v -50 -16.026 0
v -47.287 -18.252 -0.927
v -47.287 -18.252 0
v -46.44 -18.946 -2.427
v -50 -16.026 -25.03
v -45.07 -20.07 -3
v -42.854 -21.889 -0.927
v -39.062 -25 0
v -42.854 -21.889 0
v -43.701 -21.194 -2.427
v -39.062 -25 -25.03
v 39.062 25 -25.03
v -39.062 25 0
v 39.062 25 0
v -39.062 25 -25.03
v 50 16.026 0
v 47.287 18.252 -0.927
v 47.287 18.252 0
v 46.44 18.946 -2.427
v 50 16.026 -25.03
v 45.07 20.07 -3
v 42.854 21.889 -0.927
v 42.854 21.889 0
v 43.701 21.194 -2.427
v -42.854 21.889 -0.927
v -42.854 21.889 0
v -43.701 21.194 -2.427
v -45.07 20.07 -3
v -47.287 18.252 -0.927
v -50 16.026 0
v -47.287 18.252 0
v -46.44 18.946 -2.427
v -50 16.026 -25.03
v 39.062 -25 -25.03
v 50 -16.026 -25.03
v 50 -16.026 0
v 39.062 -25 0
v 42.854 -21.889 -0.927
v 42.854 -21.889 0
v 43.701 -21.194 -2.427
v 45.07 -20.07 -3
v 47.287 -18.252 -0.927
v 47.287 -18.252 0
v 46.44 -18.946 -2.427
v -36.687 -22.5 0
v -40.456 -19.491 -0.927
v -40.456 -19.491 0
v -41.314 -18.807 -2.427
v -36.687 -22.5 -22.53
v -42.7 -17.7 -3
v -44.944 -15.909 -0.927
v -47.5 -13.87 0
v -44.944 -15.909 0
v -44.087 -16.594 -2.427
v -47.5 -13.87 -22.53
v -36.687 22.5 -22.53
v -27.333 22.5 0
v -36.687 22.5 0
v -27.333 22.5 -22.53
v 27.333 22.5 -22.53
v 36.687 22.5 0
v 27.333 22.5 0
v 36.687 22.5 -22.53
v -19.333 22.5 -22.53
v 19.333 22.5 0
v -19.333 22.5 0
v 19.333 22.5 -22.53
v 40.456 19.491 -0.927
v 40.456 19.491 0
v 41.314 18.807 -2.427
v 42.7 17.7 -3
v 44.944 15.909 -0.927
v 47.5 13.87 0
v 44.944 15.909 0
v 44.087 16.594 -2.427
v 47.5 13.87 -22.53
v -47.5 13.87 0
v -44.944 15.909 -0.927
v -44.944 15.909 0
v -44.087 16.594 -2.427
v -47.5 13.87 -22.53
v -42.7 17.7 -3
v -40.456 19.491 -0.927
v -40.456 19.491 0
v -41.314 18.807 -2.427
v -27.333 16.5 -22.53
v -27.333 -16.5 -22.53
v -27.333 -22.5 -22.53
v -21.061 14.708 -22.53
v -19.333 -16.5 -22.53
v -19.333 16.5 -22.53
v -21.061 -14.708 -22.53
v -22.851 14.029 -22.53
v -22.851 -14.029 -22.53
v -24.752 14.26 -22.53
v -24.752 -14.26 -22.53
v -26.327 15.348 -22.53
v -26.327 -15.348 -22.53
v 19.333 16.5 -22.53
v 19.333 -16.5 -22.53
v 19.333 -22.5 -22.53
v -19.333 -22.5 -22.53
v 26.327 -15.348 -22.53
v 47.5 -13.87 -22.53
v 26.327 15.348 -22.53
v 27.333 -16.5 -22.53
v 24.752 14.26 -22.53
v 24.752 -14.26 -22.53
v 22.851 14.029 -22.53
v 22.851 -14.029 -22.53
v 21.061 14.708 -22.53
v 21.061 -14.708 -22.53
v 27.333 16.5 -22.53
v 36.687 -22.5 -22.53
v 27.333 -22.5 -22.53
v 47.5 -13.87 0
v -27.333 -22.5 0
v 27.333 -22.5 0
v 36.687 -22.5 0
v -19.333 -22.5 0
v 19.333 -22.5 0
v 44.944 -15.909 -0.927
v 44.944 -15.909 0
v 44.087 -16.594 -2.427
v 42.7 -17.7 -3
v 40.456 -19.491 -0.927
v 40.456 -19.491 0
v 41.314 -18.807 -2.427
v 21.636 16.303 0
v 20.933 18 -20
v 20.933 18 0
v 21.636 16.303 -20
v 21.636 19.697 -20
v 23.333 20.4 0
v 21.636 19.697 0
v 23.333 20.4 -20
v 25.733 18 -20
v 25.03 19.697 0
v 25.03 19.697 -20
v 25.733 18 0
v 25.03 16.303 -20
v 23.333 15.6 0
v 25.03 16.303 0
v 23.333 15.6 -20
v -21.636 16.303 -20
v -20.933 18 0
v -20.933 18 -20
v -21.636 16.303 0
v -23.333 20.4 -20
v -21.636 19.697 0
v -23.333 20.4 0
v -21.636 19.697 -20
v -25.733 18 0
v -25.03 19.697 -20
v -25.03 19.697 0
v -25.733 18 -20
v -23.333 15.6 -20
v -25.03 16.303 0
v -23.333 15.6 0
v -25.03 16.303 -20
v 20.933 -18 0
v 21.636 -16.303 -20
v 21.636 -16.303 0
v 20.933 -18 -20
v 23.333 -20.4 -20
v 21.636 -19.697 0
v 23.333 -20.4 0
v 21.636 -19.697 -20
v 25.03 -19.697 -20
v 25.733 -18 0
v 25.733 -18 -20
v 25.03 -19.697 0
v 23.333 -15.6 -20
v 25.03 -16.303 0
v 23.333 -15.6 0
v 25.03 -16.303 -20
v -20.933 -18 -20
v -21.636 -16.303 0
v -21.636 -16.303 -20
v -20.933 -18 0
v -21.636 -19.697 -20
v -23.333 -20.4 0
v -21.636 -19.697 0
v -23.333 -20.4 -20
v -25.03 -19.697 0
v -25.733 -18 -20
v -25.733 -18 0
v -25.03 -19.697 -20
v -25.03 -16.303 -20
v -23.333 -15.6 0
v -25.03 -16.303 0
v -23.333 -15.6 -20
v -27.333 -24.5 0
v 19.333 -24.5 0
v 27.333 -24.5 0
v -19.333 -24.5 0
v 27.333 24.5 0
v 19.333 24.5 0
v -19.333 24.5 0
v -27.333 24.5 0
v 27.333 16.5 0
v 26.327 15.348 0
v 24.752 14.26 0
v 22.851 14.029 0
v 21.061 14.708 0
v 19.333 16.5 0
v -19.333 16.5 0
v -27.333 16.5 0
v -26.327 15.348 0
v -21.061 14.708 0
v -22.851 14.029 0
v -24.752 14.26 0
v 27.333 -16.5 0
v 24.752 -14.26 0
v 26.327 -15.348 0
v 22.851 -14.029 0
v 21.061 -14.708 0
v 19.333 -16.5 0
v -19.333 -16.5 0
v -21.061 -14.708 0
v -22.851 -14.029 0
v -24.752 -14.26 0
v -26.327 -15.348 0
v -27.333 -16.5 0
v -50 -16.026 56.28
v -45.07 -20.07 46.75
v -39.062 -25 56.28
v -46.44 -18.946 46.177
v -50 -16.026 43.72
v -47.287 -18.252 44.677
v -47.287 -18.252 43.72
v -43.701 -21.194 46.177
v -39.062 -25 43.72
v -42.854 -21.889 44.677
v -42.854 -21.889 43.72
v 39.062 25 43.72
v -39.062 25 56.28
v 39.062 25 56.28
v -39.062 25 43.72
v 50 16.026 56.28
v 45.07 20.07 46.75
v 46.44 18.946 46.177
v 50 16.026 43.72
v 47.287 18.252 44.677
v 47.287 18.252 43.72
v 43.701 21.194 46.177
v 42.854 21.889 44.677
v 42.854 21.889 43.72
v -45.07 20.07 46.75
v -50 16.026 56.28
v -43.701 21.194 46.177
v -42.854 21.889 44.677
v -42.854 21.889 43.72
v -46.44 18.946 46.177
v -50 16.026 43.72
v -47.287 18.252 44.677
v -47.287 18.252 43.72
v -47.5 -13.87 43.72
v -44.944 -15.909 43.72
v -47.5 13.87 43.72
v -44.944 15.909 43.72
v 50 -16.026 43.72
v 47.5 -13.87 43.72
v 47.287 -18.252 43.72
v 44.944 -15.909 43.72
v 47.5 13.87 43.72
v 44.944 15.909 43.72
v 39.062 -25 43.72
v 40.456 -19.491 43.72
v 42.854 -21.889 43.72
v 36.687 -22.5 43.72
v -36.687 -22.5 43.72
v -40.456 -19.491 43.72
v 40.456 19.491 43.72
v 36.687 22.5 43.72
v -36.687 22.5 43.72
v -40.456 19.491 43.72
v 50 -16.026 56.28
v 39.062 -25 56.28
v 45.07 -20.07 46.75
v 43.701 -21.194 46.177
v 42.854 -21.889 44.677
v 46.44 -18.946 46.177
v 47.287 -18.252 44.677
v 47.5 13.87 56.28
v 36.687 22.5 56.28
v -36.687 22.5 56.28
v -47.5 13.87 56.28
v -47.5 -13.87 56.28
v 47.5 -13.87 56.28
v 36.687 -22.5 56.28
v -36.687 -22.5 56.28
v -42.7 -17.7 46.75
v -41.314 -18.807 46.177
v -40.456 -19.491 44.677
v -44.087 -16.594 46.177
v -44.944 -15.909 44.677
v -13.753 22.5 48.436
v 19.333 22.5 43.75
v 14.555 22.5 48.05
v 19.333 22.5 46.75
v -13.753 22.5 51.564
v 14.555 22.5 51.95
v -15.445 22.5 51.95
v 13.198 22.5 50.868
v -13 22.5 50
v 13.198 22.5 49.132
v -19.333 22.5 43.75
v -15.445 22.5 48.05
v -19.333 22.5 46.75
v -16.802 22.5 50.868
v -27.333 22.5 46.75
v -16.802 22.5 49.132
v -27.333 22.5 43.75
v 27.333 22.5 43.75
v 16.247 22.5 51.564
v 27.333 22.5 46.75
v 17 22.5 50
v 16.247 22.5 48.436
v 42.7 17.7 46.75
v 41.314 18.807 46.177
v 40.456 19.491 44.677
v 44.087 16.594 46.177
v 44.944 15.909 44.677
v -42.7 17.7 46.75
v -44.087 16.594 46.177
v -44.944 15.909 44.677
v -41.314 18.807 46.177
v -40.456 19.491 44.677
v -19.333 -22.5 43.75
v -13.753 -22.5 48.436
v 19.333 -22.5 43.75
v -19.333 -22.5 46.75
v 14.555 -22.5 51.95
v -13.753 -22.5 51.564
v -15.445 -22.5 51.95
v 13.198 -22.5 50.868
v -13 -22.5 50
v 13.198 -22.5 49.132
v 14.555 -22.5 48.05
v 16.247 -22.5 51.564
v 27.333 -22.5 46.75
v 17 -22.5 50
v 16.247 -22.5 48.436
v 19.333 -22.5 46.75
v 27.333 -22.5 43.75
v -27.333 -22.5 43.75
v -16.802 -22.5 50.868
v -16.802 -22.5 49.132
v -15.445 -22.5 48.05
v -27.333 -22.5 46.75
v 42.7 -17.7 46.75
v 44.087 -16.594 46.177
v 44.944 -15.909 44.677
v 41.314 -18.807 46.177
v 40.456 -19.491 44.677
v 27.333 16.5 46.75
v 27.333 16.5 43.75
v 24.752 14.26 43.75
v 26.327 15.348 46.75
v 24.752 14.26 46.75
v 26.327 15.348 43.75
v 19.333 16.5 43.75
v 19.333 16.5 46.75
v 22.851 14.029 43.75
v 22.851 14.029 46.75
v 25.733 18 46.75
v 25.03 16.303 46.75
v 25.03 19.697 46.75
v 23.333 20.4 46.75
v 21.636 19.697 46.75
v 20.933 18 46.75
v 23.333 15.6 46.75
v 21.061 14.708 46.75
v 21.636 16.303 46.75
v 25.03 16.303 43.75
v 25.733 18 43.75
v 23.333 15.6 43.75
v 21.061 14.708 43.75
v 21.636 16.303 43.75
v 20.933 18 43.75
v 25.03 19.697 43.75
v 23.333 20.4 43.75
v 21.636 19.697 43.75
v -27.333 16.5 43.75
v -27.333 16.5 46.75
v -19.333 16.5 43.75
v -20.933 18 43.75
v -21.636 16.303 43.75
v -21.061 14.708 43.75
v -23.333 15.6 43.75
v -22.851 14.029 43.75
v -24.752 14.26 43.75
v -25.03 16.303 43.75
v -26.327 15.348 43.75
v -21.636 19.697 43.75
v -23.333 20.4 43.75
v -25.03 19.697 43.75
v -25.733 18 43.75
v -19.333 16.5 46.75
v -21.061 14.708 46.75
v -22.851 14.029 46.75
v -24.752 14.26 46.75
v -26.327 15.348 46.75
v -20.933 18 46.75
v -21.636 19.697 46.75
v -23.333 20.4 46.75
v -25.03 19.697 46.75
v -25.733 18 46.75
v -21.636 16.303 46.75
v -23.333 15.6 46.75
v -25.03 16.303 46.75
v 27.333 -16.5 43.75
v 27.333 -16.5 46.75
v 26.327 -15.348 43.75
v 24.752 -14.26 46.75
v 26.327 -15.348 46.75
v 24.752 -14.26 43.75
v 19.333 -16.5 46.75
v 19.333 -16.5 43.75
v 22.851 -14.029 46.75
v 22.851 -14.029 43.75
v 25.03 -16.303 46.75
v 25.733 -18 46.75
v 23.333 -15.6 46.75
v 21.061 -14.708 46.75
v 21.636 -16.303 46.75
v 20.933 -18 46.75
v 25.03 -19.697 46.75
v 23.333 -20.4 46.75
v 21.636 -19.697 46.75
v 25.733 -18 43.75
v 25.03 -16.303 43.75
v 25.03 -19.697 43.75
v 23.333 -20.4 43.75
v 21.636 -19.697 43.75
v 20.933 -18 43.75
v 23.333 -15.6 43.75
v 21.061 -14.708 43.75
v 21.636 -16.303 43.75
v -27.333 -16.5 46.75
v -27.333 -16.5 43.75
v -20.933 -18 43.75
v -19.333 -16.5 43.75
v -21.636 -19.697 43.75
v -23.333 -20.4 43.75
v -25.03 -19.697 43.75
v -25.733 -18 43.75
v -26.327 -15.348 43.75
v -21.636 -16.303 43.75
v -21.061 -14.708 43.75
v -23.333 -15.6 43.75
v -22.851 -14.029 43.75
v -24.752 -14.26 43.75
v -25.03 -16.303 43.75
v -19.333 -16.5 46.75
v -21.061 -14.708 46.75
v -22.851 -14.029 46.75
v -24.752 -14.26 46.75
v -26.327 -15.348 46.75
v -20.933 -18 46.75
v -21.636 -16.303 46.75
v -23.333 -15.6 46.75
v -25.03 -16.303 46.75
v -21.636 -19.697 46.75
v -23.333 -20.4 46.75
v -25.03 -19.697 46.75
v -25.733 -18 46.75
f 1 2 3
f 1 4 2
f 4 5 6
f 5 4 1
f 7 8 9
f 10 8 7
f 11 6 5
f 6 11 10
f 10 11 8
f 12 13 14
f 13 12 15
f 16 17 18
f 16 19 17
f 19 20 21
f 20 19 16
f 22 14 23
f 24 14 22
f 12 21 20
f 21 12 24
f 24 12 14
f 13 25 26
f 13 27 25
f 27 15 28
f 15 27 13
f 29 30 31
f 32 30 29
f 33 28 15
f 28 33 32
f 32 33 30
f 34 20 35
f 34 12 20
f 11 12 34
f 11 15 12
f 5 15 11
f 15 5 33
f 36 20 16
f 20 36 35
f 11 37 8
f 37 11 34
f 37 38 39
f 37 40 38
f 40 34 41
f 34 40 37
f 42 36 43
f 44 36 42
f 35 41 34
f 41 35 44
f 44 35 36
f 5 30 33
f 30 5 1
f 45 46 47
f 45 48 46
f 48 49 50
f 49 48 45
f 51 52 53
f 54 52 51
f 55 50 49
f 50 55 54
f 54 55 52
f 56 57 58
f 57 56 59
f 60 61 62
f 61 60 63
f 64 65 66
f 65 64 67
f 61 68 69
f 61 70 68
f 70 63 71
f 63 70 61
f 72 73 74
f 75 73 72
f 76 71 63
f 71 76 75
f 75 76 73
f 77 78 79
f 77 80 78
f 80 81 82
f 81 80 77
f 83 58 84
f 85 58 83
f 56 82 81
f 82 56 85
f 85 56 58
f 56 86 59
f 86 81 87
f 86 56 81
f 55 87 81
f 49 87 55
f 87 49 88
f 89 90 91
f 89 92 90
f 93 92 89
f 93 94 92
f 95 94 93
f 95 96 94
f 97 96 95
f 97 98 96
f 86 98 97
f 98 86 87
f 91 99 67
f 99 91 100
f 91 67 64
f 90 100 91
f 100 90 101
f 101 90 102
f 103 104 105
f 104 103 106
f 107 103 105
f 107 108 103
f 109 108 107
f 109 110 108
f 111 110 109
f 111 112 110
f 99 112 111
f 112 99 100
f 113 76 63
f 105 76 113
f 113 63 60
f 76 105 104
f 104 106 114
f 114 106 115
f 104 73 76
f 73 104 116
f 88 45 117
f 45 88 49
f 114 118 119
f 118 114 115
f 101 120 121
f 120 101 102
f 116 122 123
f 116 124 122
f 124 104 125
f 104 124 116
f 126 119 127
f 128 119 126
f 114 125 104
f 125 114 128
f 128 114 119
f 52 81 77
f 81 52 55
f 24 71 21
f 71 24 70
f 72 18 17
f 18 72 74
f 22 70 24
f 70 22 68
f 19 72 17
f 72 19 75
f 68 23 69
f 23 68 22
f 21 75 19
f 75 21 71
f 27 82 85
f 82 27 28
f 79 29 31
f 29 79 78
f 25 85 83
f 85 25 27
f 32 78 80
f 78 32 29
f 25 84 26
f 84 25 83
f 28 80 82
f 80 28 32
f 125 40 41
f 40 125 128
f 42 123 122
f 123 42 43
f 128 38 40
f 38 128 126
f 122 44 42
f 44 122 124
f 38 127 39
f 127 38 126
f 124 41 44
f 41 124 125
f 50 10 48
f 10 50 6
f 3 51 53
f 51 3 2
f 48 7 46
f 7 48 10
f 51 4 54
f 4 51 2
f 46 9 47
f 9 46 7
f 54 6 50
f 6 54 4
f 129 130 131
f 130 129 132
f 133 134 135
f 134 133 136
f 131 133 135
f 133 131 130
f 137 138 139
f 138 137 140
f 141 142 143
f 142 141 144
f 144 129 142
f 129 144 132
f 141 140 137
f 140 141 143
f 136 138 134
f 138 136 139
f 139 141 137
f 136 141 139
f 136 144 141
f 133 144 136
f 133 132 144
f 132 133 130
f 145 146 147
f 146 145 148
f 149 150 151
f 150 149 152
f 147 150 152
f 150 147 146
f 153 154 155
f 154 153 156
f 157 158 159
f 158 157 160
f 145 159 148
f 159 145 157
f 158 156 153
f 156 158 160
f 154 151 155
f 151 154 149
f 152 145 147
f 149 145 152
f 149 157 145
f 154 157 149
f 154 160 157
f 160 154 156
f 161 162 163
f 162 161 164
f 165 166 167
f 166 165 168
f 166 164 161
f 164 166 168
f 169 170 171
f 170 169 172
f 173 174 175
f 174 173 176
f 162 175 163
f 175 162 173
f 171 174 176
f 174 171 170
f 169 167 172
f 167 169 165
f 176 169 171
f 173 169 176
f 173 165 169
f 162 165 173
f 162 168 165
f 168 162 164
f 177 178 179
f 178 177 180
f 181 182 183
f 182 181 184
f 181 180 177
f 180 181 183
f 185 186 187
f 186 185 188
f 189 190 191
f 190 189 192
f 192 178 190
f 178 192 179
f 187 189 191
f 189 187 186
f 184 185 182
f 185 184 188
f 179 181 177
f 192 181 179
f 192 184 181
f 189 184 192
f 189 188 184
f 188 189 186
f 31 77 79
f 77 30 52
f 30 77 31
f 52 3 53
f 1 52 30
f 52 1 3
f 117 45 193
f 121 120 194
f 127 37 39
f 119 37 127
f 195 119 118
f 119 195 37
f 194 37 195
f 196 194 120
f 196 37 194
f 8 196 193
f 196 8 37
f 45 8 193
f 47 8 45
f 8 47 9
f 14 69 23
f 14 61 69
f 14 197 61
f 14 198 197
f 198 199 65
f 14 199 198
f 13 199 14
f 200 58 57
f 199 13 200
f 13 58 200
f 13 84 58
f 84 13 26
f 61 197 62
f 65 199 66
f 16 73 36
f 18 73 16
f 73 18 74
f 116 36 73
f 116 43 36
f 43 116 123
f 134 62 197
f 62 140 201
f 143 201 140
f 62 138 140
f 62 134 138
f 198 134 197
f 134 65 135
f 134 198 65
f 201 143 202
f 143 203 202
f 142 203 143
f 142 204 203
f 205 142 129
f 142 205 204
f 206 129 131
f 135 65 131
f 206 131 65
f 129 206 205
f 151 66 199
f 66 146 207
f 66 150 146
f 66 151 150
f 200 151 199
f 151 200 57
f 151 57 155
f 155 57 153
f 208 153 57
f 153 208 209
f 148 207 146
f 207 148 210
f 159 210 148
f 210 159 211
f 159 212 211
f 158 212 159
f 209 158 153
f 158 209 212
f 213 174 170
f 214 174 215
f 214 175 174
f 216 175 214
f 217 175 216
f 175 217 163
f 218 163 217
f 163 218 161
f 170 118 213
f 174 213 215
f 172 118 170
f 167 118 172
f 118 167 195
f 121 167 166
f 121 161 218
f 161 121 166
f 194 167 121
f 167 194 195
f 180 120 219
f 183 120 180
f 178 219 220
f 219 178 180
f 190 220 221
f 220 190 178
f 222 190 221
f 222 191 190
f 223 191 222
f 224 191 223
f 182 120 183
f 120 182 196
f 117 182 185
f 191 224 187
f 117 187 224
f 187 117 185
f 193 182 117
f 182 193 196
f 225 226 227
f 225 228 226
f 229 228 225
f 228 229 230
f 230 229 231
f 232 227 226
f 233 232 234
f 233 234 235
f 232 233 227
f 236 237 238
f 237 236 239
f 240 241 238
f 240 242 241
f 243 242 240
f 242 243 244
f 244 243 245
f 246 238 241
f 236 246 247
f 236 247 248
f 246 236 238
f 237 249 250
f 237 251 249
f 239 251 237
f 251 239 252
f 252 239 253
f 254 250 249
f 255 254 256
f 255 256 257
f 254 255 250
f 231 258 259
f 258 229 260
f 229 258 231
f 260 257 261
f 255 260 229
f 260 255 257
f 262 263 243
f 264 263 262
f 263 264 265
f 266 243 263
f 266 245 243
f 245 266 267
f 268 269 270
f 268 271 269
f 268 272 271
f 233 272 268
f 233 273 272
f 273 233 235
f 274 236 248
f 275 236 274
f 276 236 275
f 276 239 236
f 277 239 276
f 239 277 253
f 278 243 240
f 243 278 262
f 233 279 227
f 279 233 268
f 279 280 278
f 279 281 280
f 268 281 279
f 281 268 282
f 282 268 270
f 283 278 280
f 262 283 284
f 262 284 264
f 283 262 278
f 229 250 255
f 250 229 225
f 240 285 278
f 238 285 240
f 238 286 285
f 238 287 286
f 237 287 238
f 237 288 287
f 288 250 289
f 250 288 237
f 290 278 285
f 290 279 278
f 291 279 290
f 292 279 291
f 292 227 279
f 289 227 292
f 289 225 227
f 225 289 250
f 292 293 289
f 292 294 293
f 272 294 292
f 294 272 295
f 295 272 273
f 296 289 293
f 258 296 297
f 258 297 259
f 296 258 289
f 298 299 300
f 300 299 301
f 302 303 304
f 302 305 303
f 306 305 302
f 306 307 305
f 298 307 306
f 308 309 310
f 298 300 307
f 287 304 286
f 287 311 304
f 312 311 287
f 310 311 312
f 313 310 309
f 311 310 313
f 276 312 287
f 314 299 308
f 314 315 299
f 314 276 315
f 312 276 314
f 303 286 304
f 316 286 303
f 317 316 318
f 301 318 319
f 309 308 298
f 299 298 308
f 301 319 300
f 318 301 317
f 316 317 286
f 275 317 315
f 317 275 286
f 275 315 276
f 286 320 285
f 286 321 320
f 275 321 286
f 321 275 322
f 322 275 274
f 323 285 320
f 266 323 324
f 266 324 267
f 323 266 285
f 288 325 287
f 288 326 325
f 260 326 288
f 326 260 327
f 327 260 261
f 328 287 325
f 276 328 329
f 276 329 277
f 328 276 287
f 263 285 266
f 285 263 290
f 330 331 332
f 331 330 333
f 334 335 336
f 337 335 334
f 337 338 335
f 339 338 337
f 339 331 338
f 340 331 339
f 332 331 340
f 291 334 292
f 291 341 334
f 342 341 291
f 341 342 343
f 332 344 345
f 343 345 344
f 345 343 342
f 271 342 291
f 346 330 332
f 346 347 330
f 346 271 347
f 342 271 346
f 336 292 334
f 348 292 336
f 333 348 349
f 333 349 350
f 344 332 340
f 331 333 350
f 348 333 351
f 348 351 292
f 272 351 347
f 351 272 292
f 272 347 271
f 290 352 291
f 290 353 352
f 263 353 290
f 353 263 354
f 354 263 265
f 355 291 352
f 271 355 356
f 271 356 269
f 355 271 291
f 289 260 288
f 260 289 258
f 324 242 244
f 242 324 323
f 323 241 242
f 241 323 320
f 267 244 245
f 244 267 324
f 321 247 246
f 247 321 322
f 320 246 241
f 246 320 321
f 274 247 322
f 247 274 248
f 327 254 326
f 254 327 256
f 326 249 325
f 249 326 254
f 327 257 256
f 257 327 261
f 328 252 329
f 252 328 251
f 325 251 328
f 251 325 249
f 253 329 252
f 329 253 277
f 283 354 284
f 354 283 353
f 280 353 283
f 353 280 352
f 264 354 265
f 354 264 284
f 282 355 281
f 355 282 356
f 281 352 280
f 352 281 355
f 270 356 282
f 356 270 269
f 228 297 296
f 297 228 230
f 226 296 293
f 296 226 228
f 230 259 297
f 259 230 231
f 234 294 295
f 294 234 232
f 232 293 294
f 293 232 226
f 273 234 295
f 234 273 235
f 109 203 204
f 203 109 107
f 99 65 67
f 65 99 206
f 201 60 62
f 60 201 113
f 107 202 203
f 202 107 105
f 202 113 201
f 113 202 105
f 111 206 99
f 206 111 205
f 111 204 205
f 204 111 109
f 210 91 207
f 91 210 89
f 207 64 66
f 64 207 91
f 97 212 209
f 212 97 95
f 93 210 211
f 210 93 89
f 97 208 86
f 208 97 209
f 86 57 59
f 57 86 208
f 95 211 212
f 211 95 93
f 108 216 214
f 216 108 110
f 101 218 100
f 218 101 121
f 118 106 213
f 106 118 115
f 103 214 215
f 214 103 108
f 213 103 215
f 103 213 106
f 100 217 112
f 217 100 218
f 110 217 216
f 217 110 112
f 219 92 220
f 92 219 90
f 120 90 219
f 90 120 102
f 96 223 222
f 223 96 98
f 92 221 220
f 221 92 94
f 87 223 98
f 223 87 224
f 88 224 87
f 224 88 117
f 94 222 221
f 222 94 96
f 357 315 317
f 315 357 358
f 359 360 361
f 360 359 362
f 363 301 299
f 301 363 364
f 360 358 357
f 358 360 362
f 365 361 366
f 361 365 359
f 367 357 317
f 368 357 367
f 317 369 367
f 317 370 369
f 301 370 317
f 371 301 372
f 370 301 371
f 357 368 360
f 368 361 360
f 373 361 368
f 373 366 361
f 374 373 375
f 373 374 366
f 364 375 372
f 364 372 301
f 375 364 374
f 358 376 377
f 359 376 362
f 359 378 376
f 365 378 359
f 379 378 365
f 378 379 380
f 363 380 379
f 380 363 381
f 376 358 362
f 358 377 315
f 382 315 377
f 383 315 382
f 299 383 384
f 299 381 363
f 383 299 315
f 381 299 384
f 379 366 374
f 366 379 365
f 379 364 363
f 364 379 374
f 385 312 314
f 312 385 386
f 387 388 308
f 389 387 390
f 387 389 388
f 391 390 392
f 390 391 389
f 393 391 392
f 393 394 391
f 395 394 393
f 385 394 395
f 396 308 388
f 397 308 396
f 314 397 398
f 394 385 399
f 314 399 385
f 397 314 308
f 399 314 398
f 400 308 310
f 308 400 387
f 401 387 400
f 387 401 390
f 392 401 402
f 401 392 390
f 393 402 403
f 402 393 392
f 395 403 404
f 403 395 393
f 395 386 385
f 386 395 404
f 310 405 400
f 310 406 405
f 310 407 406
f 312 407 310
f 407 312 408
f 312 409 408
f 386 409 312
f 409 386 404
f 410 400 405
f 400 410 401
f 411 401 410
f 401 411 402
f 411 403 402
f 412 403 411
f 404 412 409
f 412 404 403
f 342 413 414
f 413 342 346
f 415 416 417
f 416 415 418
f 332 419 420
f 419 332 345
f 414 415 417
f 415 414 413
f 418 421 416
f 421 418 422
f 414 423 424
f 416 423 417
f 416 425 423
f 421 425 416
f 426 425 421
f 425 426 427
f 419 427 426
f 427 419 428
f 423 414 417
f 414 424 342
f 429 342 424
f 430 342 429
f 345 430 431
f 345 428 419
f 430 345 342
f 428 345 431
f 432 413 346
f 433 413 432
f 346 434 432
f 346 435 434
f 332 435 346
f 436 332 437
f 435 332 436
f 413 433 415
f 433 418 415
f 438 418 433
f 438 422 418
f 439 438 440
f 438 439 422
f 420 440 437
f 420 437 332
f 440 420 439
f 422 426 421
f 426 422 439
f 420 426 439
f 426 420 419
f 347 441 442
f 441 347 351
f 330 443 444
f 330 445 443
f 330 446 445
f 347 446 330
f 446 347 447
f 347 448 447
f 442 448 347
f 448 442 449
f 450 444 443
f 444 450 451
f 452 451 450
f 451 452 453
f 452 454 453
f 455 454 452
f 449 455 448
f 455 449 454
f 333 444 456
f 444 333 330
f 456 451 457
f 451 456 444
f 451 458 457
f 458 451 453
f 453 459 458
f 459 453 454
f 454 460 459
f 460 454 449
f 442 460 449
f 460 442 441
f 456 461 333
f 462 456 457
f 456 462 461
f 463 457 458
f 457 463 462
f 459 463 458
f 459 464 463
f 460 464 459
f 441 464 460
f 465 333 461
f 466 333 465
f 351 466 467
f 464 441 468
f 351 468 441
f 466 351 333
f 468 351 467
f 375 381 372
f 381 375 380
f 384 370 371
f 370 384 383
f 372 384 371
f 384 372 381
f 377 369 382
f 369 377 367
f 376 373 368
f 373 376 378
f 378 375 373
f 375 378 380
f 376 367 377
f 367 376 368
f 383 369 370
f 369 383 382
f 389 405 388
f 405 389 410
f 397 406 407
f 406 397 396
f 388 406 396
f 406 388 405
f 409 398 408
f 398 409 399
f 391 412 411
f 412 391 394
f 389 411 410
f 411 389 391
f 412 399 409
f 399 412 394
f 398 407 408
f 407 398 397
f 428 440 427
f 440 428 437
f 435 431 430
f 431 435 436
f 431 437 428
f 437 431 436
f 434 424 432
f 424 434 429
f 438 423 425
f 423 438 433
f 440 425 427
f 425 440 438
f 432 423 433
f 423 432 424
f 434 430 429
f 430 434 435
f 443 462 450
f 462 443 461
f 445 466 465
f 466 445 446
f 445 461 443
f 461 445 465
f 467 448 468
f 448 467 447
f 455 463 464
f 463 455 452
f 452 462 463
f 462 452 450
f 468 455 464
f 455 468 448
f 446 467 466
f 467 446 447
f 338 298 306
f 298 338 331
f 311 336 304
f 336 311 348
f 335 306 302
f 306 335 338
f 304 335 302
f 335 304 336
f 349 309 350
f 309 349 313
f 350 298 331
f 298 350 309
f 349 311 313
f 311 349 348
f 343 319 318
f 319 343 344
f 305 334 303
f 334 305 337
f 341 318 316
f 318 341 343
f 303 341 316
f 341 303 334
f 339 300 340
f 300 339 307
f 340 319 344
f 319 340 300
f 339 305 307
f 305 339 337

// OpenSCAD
include <constructive-compiled.scad>
$skinThick=5;

full_size = [100, 50, 50];
dymh_diameter = 6;
dymh_big_diameter = 14;
wall_width = 5;

partColors = [
    ["base", yellow, 0.8],
    ["screws",grey,0.8],
    ["screwMounts",red,.8],
    ["stm32",green,.8],
    ["top",blue,.8]
];

assemble("base,stm32,top,screws,screwMounts,stm32_protection") {
    base();
    top();
}


module base() autoColor(custom=partColors)
{
    add("base") chamfer(0, 0, -dymh_big_diameter, fnCorner=2) box(x = full_size[0], y = full_size[1], z = full_size[2]);
    remove("base") chamfer(0, 0, -dymh_big_diameter, fnCorner=2) box(x = full_size[0] - wall_width, y = full_size[1] - wall_width, z = full_size[2] - wall_width);
    remove("base") two() reflectY(sides()) two() reflectX(sides()) g(X(-full_size[0]/2), Y(-full_size[1]/2), turnXZ(90), turnYZ(45)) tube(d=dymh_diameter,h=40, solid=true);

    two() reflectY(sides()) two() reflectX(sides()) g(X(-full_size[0]/3 + 10), Y(-full_size[1]/2 + wall_width + 2), Z(-full_size[2]/4)) {
        hull() add("screwMounts") tube(d=8, h=full_size[2]/2, solid=true) Y(-wall_width/2) box(8, z=full_size[2]/2);
        remove("screwMounts,base") Z(-full_size[2]/4 + 5) screwM4(h=full_size[2]/2, noNut=true);
    }

    remove("base") align(TOUP) box(x = full_size[0]+10, y = full_size[1]+10, z = full_size[2]);
}

module top() autoColor(custom=partColors)
{
    g(Z(full_size[2])) {
        add("top") chamfer(0, 0, -dymh_big_diameter, fnCorner=2) box(x = full_size[0], y = full_size[1], z = full_size[2] / 4);
        add("stm32_protection") pieces(2) g(X(-full_size[0]/2 + full_size[0]/4 + 10), X(span(full_size[0]/2 - 20)), turnYZ(90)) tube(d=4, h=full_size[1], solid=true);
        remove("top") chamfer(0, 0, -dymh_big_diameter, fnCorner=2) box(x = full_size[0] - wall_width, y = full_size[1] - wall_width, z = full_size[2] / 2 + wall_width);
        remove("top") two() reflectY(sides()) two() reflectX(sides()) g(X(-full_size[0]/2), Y(-full_size[1]/2), Z(-full_size[2]/8), turnXZ(90), turnYZ(45)) tube(d=dymh_diameter,h=40, solid=true);

        mount_height = 3;
        two() reflectY(sides()) two() reflectX(sides()) g(X(-full_size[0]/3 + 10), Y(-full_size[1]/2 + wall_width + 2), Z(-full_size[2]/8 + mount_height/2)) {
            hull() add("screwMounts") tube(d=8, h=mount_height, solid=true) Y(-wall_width/2) box(8, h=mount_height);
            remove("screwMounts,top") Z(-mount_height) screwM4(h=full_size[2]/4, noNut=true);
        }
    }
}

between_pins = 2.54;
stm32_size = [53, 23, 25];
module stm32_volume() {
    difference() {
        cube(stm32_size); // размер который занимает stm32 
        for (pin = [0 : 19]) {
            translate([1.85 + between_pins * pin, 3, 0]) {
                cube([1, 1, stm32_size[2]]);
            }
        }

        for (pin = [0 : 19]) {
            translate([1.85 + between_pins * pin, stm32_size[1] - 3, 0]) {
                cube([1, 1, stm32_size[2]]);
            }
        }
    }
}
// stm32_volume();


// DYMH-106 size
// {
//     8 - height
//     13 diameter 
// }
function bottom_corners(sizes) = [[0, 0 ,0], [sizes[0], 0, 0], [sizes[0], sizes[1], 0], [0, sizes[1], 0]];

module triangle(katet_size) {
    CubePoints = [
        [  0,  0,  0 ],  //0
        [ katet_size,  0,  0 ],  //1
        [  0,  katet_size,  0 ],  //2
        [  0,  0,  full_size[2] ],  //3
        [ katet_size,  0,  full_size[2] ],  //4
        [  0,  katet_size,  full_size[2] ] //5
    ];

    CubeFaces = [
        [0,1,2],  // bottom
        [3,4,1,0],  // front
        [5,4,3],  // top
        [4,5,2,1],  // back
        [5,3,0,2]
    ]; // left

    polyhedron( CubePoints, CubeFaces );
}

module platform() {
    difference() {
        cube(full_size);
        corners = bottom_corners(full_size);

        for (i = [0:3]) {
            translate( [corners[i][0], corners[i][1], 0] ) {
                rotate([0, 0, 90 * i]) {
                    triangle(10); // for katet=10 gipotenuza will be ~14, which is close to DYMH-106 diameter (biggest part)
                }
            }
        }
    }
}
module inside_platform() {
    local_cube = [for (x = full_size) x - wall_width * 2];
    triangle_katet = 10;
    translate([wall_width, wall_width, wall_width]) {
        difference() {
            cube(local_cube);

            corners = bottom_corners(local_cube);
            for (i = [0:3]) {
                translate([corners[i][0], corners[i][1], 0]) {
                    rotate([0, 0, 90 * i]) {
                        triangle(triangle_katet);
                    }
                }
            }
        }
    }
} 

module plain_drawing() {
    difference() {
        platform();
        inside_platform();
        dymh_holes();
        translate([-10, -10, full_size[2] / 2]) {
            cube([500, 500, 200]);
        }
    }
}

module dymh_holes() {
    corners = bottom_corners(full_size);
    for (i = [0:3]) {
        translate([corners[i][0], corners[i][1], 0]) {
            translate([0, 0, full_size[2] / 2]) {
                rotate([90, 0 , 135 + 90 * i]) {
                    cylinder(20, d1 = dymh_diameter , d2 = dymh_diameter);
                }
            }
        }
    }
}
// plain_drawing();
// module pit_posts() {
//     cylinder()
// }
